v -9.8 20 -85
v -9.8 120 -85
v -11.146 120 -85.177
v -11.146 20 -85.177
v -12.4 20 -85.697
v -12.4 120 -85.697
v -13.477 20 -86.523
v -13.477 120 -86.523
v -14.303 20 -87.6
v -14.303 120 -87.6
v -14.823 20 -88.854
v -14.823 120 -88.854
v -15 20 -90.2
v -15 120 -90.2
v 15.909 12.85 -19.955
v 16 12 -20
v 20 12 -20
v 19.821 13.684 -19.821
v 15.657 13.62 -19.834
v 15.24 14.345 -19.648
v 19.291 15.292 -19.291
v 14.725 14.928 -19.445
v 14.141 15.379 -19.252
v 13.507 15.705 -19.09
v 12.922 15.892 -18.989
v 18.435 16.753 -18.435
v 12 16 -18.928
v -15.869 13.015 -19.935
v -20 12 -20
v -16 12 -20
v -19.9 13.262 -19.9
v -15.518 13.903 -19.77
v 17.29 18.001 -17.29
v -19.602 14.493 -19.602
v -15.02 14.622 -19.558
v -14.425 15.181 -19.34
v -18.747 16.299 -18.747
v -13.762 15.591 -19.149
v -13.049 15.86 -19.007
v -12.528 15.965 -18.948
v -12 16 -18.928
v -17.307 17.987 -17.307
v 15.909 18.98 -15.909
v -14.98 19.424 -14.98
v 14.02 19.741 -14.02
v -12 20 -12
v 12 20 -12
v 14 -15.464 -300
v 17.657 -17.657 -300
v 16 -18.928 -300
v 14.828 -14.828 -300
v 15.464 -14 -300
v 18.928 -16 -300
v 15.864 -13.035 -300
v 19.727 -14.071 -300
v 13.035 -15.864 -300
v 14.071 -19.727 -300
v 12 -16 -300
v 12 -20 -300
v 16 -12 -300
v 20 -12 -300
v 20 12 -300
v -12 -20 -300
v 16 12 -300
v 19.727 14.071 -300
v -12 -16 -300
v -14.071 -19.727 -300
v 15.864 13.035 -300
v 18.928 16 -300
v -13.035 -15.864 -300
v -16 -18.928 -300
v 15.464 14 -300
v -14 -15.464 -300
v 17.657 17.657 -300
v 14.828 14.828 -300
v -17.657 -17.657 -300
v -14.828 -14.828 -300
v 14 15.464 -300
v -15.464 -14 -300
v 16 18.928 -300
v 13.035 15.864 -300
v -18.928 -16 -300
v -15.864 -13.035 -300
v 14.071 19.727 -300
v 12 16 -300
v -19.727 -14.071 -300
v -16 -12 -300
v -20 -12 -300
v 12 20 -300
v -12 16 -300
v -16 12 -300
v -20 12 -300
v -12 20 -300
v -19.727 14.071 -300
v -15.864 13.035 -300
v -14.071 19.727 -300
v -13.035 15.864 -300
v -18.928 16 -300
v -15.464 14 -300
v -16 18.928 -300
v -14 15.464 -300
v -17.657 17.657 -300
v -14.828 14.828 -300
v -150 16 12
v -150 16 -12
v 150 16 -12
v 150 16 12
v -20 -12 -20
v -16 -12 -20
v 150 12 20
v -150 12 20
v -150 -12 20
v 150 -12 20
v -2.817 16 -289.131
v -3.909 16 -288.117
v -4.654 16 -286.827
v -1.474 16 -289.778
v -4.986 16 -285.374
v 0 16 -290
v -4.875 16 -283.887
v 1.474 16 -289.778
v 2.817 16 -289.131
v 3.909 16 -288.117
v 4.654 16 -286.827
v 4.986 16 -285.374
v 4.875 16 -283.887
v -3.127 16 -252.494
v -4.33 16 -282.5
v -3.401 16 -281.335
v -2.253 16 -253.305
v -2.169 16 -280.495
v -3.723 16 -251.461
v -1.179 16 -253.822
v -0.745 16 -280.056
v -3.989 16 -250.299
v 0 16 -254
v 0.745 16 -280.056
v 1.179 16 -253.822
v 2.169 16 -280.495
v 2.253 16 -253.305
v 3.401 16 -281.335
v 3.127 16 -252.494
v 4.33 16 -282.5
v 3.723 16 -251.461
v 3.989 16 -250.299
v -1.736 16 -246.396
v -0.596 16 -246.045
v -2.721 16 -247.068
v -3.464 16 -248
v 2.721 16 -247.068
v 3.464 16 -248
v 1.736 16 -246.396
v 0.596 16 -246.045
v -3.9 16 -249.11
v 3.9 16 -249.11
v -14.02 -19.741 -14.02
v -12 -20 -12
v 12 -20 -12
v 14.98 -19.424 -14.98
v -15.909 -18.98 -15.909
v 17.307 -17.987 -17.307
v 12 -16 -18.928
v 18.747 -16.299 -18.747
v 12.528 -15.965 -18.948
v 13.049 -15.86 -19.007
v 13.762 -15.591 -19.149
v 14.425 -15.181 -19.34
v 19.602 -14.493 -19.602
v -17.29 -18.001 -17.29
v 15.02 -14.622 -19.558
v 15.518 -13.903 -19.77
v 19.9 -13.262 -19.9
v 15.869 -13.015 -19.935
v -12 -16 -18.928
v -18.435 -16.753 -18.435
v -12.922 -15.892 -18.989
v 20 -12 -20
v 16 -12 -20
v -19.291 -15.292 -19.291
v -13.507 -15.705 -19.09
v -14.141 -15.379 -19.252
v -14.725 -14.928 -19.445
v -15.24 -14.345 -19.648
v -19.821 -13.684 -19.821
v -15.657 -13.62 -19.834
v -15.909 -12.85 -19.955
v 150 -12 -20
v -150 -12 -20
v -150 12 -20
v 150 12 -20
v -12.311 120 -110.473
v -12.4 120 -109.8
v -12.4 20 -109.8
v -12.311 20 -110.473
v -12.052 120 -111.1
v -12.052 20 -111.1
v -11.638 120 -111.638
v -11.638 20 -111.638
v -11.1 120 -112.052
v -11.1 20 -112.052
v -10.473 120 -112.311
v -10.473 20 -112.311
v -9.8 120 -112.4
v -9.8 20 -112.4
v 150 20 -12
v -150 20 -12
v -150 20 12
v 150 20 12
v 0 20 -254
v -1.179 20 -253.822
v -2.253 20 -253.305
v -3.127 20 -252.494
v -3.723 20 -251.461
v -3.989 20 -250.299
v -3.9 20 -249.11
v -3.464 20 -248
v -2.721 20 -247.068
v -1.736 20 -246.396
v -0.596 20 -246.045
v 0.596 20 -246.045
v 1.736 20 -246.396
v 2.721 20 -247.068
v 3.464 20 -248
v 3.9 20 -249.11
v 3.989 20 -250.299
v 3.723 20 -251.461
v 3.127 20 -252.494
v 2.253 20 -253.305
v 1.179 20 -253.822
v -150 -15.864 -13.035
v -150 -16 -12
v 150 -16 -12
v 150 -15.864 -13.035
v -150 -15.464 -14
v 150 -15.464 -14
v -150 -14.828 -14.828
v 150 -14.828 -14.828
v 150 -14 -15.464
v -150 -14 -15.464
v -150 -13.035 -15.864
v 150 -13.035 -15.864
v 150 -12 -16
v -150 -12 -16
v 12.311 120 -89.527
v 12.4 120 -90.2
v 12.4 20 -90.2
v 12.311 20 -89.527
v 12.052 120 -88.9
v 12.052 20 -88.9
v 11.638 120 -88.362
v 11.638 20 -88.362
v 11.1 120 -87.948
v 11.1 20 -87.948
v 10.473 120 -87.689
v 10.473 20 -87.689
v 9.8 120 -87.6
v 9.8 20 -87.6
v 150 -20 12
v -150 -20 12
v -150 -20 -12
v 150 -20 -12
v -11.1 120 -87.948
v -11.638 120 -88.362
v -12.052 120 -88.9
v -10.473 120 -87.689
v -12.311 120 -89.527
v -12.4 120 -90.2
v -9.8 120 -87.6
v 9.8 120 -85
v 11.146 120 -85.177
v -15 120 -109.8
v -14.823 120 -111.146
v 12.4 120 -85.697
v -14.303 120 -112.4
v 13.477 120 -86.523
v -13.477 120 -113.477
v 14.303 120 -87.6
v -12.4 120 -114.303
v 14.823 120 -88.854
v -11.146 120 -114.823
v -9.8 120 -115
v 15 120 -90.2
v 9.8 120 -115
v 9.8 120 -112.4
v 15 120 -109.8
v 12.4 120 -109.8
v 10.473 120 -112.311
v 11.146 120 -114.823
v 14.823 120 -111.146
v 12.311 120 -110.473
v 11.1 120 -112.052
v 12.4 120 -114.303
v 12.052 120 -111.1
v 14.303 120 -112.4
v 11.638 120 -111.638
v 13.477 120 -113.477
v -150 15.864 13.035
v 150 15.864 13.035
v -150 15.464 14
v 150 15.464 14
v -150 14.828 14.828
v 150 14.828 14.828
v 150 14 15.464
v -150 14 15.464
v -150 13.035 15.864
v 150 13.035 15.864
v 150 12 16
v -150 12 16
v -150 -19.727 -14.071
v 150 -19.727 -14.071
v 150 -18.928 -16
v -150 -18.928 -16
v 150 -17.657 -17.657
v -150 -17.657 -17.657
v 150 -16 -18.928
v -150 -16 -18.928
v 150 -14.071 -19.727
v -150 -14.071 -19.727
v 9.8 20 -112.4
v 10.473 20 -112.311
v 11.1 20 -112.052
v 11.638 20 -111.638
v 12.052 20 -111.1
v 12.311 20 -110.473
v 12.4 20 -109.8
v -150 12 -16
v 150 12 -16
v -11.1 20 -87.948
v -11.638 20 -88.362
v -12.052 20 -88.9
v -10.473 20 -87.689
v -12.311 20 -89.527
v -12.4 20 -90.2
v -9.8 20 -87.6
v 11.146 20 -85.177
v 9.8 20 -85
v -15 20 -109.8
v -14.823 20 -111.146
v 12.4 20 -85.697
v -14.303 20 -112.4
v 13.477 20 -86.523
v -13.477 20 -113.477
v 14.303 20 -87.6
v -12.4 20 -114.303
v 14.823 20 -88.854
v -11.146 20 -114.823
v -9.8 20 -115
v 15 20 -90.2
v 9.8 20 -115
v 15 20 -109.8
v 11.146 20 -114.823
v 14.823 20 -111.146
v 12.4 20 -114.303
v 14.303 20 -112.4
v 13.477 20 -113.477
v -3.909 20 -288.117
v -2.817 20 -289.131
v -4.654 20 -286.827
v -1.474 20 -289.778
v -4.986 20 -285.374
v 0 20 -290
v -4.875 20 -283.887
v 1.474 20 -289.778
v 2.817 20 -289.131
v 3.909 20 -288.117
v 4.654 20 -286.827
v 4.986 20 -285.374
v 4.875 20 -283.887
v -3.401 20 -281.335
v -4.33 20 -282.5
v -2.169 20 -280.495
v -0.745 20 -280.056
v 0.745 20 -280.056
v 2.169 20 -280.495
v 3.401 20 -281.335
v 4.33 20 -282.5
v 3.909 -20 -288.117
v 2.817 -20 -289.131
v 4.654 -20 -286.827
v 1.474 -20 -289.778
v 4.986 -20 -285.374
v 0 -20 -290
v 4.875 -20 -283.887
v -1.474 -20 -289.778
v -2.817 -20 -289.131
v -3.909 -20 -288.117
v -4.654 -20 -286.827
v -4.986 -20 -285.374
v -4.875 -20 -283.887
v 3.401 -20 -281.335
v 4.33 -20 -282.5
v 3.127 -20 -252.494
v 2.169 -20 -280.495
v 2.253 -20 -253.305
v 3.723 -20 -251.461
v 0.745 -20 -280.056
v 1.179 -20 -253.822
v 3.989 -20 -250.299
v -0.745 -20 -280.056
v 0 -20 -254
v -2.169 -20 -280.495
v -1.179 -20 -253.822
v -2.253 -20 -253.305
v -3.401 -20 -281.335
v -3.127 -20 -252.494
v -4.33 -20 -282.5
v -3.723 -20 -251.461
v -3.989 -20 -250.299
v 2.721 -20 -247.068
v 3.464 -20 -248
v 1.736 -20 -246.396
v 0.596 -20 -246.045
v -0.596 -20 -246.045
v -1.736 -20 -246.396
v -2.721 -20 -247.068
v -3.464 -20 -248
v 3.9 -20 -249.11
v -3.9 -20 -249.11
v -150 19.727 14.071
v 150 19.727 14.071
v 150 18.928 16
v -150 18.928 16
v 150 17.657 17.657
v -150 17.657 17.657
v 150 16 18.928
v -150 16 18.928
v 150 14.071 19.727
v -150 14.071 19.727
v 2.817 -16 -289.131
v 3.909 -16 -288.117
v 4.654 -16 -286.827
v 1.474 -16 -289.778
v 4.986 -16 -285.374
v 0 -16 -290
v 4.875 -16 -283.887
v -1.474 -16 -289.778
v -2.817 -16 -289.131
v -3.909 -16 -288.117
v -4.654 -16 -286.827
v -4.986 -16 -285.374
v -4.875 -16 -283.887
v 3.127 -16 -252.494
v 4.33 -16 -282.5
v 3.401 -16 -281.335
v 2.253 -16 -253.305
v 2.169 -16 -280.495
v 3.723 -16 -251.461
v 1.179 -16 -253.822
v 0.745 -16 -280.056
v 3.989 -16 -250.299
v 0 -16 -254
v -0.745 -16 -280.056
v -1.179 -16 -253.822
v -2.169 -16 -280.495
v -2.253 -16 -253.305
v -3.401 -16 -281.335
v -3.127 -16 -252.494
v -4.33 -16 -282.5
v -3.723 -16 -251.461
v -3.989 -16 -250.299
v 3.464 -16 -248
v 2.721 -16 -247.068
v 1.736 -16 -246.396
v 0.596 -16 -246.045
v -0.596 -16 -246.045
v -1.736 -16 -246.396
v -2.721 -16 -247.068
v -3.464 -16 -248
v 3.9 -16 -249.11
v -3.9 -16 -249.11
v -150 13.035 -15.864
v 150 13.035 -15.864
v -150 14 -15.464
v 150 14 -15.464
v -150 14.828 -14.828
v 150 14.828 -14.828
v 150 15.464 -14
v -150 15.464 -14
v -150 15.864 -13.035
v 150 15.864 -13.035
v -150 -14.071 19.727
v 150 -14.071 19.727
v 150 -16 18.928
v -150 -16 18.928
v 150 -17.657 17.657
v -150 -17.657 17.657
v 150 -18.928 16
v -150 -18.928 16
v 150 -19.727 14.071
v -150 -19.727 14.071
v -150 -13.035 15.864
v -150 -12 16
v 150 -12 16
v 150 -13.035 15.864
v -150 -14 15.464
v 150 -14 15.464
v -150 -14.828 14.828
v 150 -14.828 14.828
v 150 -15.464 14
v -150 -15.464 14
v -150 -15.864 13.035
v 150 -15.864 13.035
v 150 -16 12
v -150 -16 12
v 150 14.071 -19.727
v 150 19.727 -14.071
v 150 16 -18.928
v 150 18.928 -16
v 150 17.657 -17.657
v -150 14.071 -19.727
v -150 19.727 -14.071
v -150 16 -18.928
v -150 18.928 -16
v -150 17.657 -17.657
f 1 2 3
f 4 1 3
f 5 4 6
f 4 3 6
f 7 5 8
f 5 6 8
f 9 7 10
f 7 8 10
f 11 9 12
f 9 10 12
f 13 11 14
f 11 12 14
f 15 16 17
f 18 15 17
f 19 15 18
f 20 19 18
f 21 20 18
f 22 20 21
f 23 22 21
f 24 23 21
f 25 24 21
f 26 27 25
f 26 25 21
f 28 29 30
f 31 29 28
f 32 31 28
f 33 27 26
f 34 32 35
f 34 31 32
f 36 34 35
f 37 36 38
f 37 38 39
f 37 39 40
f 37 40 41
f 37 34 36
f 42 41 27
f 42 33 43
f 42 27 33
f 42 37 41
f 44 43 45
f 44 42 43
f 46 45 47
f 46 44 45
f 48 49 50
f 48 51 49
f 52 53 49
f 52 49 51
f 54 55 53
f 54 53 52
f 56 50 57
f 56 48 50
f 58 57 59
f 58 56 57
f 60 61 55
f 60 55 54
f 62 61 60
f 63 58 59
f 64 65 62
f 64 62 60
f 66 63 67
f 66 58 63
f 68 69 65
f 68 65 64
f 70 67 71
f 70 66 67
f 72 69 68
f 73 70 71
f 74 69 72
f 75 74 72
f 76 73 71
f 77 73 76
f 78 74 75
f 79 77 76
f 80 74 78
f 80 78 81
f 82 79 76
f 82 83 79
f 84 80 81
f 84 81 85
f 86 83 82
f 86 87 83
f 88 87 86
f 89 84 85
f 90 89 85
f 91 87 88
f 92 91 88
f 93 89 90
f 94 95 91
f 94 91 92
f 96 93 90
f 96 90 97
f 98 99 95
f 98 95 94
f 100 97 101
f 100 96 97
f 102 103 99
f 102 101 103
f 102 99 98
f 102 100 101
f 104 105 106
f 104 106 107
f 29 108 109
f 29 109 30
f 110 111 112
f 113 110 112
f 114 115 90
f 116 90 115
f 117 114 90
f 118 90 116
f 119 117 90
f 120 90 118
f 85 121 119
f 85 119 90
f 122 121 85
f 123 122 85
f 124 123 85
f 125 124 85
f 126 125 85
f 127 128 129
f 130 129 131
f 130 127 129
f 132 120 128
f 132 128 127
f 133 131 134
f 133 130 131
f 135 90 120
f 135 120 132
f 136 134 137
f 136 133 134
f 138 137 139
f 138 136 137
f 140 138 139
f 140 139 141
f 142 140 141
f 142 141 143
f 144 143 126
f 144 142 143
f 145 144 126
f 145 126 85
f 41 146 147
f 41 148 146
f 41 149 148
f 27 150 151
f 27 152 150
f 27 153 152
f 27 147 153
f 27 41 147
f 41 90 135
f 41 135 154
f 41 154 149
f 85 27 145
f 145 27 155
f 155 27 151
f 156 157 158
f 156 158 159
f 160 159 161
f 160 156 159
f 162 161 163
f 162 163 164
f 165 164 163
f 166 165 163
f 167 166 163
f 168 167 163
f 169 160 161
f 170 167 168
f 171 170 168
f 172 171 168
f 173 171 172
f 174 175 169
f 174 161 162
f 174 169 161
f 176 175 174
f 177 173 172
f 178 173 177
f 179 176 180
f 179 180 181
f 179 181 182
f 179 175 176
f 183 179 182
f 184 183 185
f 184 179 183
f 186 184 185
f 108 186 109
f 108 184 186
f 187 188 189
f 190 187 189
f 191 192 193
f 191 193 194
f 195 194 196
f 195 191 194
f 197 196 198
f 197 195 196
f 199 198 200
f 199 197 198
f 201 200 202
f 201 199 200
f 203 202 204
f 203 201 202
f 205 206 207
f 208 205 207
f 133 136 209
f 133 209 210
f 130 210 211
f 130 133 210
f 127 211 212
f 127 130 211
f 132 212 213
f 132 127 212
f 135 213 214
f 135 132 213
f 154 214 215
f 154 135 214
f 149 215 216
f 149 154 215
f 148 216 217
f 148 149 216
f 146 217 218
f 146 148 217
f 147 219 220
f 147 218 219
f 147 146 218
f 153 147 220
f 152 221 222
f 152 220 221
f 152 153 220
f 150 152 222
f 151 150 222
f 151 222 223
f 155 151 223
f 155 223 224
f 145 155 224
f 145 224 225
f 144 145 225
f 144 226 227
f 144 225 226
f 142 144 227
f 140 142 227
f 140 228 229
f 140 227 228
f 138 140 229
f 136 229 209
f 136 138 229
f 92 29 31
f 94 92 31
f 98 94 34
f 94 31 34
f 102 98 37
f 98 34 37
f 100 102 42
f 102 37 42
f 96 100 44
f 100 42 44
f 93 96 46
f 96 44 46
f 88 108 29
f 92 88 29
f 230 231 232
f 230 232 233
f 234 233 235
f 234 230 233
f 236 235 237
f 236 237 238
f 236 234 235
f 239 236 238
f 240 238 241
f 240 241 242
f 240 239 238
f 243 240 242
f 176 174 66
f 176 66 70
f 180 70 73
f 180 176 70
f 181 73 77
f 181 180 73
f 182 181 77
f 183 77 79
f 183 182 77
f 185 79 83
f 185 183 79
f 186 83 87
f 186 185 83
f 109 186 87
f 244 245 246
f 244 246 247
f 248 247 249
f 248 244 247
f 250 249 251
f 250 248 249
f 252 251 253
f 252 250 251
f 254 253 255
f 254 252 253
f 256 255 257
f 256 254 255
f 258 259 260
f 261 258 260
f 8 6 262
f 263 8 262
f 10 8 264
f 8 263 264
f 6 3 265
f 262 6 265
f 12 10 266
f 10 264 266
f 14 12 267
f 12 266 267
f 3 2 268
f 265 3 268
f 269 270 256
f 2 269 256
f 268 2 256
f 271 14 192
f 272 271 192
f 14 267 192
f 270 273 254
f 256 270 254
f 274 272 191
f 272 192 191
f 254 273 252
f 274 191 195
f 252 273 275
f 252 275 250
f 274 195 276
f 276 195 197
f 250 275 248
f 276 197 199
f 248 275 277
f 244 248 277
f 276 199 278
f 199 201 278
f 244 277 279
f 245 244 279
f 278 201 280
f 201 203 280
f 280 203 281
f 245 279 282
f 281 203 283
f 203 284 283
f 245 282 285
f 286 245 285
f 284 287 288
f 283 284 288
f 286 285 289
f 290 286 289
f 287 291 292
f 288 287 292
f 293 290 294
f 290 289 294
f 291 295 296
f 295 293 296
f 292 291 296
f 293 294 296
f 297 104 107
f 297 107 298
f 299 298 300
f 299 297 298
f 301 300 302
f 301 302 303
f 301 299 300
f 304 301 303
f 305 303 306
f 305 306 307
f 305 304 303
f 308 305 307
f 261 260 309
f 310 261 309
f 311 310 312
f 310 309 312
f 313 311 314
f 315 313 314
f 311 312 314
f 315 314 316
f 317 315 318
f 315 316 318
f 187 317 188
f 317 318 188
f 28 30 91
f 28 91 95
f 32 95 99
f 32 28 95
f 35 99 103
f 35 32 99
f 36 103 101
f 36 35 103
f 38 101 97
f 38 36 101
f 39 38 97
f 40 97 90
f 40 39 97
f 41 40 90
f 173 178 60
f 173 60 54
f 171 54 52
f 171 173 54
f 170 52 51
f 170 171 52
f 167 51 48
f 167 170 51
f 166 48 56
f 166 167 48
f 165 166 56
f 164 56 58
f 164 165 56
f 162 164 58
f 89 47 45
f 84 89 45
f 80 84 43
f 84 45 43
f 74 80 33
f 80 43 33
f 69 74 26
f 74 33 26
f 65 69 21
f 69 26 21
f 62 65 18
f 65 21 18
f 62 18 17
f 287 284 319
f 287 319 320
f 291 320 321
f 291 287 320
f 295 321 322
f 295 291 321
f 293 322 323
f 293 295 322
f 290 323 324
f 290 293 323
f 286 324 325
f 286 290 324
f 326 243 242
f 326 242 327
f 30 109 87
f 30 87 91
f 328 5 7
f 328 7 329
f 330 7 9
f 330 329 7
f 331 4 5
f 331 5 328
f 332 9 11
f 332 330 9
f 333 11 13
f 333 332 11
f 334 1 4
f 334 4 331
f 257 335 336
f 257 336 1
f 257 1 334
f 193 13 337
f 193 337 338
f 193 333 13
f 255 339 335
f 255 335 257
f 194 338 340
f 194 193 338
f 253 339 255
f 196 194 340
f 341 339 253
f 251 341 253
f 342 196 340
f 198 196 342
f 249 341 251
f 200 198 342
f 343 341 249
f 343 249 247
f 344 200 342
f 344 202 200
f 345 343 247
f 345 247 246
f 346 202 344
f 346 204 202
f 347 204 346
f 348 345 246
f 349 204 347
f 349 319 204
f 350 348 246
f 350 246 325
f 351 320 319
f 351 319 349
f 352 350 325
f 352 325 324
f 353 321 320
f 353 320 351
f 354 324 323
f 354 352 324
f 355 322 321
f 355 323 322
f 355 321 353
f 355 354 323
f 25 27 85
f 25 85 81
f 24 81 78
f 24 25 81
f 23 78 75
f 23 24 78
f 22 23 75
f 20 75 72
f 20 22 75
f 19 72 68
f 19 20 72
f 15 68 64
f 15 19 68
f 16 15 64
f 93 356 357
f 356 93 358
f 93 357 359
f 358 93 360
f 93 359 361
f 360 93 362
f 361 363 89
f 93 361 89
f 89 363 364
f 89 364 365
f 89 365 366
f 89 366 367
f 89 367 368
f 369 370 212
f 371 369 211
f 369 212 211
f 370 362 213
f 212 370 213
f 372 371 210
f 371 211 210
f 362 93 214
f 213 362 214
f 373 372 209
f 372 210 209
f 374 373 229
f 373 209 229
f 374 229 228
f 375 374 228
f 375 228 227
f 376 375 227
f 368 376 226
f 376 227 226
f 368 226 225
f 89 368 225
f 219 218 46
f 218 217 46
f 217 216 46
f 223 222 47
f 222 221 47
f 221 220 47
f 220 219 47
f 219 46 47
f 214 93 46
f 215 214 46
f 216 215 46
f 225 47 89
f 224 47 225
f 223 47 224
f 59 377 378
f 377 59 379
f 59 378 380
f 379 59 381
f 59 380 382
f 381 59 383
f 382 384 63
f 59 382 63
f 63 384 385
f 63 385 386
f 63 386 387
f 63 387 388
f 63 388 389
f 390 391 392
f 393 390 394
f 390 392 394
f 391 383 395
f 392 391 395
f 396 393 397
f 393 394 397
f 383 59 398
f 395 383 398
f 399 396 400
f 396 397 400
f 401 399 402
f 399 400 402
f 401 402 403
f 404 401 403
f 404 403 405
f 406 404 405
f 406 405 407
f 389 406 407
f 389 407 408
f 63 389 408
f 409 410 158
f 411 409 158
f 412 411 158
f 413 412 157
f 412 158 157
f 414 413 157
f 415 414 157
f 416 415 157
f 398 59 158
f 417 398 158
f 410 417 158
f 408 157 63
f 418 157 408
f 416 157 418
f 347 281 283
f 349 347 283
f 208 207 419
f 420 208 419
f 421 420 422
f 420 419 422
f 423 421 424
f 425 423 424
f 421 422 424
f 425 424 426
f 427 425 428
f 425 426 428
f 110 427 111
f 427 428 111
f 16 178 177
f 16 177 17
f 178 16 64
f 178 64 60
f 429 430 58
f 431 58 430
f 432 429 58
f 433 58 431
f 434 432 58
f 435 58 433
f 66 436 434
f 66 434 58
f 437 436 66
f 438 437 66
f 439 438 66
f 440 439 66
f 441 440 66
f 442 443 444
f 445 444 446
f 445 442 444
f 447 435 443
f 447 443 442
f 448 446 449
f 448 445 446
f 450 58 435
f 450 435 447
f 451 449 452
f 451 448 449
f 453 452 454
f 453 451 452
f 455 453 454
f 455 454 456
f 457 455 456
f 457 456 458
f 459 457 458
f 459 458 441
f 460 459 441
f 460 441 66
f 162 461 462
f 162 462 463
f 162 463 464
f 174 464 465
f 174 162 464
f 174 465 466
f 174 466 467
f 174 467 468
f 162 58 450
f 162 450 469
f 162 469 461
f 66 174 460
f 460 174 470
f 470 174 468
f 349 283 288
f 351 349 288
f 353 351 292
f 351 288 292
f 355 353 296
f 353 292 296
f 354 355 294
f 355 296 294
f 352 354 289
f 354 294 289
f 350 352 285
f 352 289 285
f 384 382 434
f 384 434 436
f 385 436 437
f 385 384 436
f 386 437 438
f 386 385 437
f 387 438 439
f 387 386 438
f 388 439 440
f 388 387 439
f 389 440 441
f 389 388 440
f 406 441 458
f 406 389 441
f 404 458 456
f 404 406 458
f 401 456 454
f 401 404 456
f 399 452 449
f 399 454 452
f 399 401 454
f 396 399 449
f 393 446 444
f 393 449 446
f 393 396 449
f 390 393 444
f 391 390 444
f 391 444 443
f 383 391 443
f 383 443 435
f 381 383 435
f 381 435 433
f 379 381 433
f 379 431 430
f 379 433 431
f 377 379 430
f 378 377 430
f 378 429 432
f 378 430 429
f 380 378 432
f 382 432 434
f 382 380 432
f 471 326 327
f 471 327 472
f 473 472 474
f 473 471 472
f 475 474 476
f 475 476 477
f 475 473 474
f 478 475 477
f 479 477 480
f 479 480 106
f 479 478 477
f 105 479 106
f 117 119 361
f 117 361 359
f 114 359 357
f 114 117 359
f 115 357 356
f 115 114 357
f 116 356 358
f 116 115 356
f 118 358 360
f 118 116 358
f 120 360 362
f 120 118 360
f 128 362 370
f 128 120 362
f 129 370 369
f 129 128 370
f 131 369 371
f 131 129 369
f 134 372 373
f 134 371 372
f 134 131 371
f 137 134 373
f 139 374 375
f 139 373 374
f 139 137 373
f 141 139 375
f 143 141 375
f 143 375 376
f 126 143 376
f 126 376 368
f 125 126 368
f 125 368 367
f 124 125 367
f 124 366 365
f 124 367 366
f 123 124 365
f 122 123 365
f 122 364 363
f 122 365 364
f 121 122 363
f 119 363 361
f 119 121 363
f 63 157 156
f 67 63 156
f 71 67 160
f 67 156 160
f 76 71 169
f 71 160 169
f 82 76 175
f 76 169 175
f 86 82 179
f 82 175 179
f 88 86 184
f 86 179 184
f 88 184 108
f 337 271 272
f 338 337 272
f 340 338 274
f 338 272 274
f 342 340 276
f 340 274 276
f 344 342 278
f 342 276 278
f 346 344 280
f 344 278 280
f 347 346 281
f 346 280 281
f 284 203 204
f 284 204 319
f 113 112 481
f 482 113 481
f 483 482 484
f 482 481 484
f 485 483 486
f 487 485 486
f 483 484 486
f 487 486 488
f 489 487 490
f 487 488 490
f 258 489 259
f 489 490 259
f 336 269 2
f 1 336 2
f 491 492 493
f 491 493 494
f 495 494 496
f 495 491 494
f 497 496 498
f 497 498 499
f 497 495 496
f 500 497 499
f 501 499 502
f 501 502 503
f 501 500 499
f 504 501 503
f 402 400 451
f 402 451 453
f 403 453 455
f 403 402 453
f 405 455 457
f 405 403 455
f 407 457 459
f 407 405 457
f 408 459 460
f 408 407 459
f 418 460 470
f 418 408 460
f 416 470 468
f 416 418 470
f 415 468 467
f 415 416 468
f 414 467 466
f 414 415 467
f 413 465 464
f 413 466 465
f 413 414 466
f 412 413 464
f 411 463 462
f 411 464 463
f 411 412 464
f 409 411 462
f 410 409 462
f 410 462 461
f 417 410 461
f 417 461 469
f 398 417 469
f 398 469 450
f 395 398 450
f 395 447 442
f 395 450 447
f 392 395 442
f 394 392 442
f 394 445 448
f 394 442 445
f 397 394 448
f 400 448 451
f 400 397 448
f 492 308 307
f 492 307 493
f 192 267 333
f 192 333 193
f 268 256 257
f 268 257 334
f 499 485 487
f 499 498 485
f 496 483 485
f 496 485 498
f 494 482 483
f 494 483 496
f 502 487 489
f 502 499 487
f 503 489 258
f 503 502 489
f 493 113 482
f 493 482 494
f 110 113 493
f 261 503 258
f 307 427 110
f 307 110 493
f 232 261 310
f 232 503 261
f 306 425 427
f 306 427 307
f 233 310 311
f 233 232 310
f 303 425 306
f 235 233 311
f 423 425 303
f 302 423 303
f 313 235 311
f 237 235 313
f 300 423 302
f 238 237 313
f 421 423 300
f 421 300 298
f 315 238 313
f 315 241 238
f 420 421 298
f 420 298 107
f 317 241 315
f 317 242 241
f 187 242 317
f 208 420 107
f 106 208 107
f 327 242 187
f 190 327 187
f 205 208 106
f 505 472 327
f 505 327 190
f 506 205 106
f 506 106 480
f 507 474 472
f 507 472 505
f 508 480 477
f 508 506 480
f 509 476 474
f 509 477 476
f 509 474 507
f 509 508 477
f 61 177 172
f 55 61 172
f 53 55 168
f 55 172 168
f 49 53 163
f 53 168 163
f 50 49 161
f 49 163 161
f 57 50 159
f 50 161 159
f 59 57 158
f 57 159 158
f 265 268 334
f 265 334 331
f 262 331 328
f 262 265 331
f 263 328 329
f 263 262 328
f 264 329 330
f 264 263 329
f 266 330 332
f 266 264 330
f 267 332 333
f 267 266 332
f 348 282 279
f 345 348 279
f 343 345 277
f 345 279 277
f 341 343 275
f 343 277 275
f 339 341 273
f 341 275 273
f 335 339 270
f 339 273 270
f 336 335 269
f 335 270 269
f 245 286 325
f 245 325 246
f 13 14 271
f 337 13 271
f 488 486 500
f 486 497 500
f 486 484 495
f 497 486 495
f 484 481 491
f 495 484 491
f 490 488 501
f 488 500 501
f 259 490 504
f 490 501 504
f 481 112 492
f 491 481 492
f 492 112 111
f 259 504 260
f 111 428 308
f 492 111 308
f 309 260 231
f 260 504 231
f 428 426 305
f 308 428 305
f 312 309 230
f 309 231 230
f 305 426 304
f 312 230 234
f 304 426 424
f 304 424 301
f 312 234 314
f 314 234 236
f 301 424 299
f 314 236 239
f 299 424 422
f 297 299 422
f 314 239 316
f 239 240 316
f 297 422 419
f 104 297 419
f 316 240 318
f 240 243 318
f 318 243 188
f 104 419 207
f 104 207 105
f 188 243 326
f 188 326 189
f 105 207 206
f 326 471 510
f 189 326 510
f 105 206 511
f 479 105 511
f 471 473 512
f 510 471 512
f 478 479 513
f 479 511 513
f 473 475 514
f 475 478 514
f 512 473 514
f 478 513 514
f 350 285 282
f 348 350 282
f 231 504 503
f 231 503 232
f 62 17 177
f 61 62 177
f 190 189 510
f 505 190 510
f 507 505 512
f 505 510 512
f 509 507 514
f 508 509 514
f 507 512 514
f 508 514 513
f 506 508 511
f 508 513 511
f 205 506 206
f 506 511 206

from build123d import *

# Parameters (mm, degrees)
SQUARE_TUBE_CONFIGURED_40_X_40_X_4_1_DEPTH   = 300
SQUARE_TUBE_CONFIGURED_40_X_40_X_4_2_DEPTH   = 300
SQUARE_TUBE_CONFIGURED_30_X_30_X_2_6_1_DEPTH = 100
CORTE_EXTRUS_O1_DEPTH                        = 351.000000086
CORTE_EXTRUS_O1_DEPTH_BACK                   = 351.000000086
ESBO_O8_R                                    = 5
ESBO_O8_R_2                                  = 4


with BuildPart() as part:
    # Sketch11 → Square tube - configured 40 X 40 X 4(1) (new body)
    with BuildSketch(Plane(origin=(-150, 0, 0), x_dir=(0, 0, -1), z_dir=(1, 0, 0))):
        with BuildLine():
            Line((-12, -20), (12, -20))
            ThreePointArc((12, -20), (17.656854249, -17.656854249), (20, -12))
            Line((20, -12), (20, 12))
            ThreePointArc((20, 12), (17.656854249, 17.656854249), (12, 20))
            Line((12, 20), (-12, 20))
            ThreePointArc((-12, 20), (-17.656854249, 17.656854249), (-20, 12))
            Line((-20, 12), (-20, -12))
            ThreePointArc((-20, -12), (-17.656854249, -17.656854249), (-12, -20))
        make_face()
        with BuildLine():
            Line((-12, -16), (12, -16))
            ThreePointArc((12, -16), (14.828427125, -14.828427125), (16, -12))
            Line((16, -12), (16, 12))
            ThreePointArc((16, 12), (14.828427125, 14.828427125), (12, 16))
            Line((12, 16), (-12, 16))
            ThreePointArc((-12, 16), (-14.828427125, 14.828427125), (-16, 12))
            Line((-16, 12), (-16, -12))
            ThreePointArc((-16, -12), (-14.828427125, -14.828427125), (-12, -16))
        make_face(mode=Mode.SUBTRACT)
    extrude(amount=SQUARE_TUBE_CONFIGURED_40_X_40_X_4_1_DEPTH)


with BuildPart() as body_2:
    # Sketch1 → Square tube - configured 40 X 40 X 4(2) (new body)
    with BuildSketch(Plane(origin=(0, 0, 0), x_dir=(-1, 0, 0), z_dir=(0, 0, -1))):
        with BuildLine():
            Line((-12, -20), (12, -20))
            ThreePointArc((12, -20), (17.656854249, -17.656854249), (20, -12))
            Line((20, -12), (20, 12))
            ThreePointArc((20, 12), (17.656854249, 17.656854249), (12, 20))
            Line((12, 20), (-12, 20))
            ThreePointArc((-12, 20), (-17.656854249, 17.656854249), (-20, 12))
            Line((-20, 12), (-20, -12))
            ThreePointArc((-20, -12), (-17.656854249, -17.656854249), (-12, -20))
        make_face()
        with BuildLine():
            Line((-12, -16), (12, -16))
            ThreePointArc((12, -16), (14.828427125, -14.828427125), (16, -12))
            Line((16, -12), (16, 12))
            ThreePointArc((16, 12), (14.828427125, 14.828427125), (12, 16))
            Line((12, 16), (-12, 16))
            ThreePointArc((-12, 16), (-14.828427125, 14.828427125), (-16, 12))
            Line((-16, 12), (-16, -12))
            ThreePointArc((-16, -12), (-14.828427125, -14.828427125), (-12, -16))
        make_face(mode=Mode.SUBTRACT)
    extrude(amount=SQUARE_TUBE_CONFIGURED_40_X_40_X_4_2_DEPTH)

    # Aparar_Estender1 45: cut part
    add(part.part, mode=Mode.SUBTRACT)


with BuildPart() as body_3:
    # of the pieces the cut leaves, the one that is kept (aparar_estender1_keep_1)
    add(body_2.part.solids().sort_by_distance((-12, -20, -12))[0])

    # Esboço8 → Corte-extrusão1 (cut, two sides: drawn at the far end of the back side and taken through both)
    with BuildSketch(Plane(origin=(0, 20, 0), x_dir=(1, 0, 0), z_dir=(0, 1, 0)).offset(-CORTE_EXTRUS_O1_DEPTH_BACK)):
        with Locations(Location((0, 285, 0), (0, 0, 90))):
            Circle(ESBO_O8_R)
        with Locations(Location((0, 250, 0), (0, 0, 90))):
            Circle(ESBO_O8_R_2)
    extrude(amount=CORTE_EXTRUS_O1_DEPTH + CORTE_EXTRUS_O1_DEPTH_BACK, mode=Mode.SUBTRACT)


with BuildPart() as body_3_2:
    # Sketch13 → Square tube - configured 30 X 30 X 2.6(1) (new body)
    with BuildSketch(Plane(origin=(0, 120, -100), x_dir=(0, 0, -1), z_dir=(0, -1, 0))):
        with BuildLine():
            Line((-9.8, -15), (9.8, -15))
            ThreePointArc((9.8, -15), (13.476955262, -13.476955262), (15, -9.8))
            Line((15, -9.8), (15, 9.8))
            ThreePointArc((15, 9.8), (13.476955262, 13.476955262), (9.8, 15))
            Line((9.8, 15), (-9.8, 15))
            ThreePointArc((-9.8, 15), (-13.476955262, 13.476955262), (-15, 9.8))
            Line((-15, 9.8), (-15, -9.8))
            ThreePointArc((-15, -9.8), (-13.476955262, -13.476955262), (-9.8, -15))
        make_face()
        with BuildLine():
            Line((-9.8, -12.4), (9.8, -12.4))
            ThreePointArc((9.8, -12.4), (11.638477631, -11.638477631), (12.4, -9.8))
            Line((12.4, -9.8), (12.4, 9.8))
            ThreePointArc((12.4, 9.8), (11.638477631, 11.638477631), (9.8, 12.4))
            Line((9.8, 12.4), (-9.8, 12.4))
            ThreePointArc((-9.8, 12.4), (-11.638477631, 11.638477631), (-12.4, 9.8))
            Line((-12.4, 9.8), (-12.4, -9.8))
            ThreePointArc((-12.4, -9.8), (-11.638477631, -11.638477631), (-9.8, -12.4))
        make_face(mode=Mode.SUBTRACT)
    extrude(amount=SQUARE_TUBE_CONFIGURED_30_X_30_X_2_6_1_DEPTH)


solid = Compound([part.part, body_3.part, body_3_2.part])
